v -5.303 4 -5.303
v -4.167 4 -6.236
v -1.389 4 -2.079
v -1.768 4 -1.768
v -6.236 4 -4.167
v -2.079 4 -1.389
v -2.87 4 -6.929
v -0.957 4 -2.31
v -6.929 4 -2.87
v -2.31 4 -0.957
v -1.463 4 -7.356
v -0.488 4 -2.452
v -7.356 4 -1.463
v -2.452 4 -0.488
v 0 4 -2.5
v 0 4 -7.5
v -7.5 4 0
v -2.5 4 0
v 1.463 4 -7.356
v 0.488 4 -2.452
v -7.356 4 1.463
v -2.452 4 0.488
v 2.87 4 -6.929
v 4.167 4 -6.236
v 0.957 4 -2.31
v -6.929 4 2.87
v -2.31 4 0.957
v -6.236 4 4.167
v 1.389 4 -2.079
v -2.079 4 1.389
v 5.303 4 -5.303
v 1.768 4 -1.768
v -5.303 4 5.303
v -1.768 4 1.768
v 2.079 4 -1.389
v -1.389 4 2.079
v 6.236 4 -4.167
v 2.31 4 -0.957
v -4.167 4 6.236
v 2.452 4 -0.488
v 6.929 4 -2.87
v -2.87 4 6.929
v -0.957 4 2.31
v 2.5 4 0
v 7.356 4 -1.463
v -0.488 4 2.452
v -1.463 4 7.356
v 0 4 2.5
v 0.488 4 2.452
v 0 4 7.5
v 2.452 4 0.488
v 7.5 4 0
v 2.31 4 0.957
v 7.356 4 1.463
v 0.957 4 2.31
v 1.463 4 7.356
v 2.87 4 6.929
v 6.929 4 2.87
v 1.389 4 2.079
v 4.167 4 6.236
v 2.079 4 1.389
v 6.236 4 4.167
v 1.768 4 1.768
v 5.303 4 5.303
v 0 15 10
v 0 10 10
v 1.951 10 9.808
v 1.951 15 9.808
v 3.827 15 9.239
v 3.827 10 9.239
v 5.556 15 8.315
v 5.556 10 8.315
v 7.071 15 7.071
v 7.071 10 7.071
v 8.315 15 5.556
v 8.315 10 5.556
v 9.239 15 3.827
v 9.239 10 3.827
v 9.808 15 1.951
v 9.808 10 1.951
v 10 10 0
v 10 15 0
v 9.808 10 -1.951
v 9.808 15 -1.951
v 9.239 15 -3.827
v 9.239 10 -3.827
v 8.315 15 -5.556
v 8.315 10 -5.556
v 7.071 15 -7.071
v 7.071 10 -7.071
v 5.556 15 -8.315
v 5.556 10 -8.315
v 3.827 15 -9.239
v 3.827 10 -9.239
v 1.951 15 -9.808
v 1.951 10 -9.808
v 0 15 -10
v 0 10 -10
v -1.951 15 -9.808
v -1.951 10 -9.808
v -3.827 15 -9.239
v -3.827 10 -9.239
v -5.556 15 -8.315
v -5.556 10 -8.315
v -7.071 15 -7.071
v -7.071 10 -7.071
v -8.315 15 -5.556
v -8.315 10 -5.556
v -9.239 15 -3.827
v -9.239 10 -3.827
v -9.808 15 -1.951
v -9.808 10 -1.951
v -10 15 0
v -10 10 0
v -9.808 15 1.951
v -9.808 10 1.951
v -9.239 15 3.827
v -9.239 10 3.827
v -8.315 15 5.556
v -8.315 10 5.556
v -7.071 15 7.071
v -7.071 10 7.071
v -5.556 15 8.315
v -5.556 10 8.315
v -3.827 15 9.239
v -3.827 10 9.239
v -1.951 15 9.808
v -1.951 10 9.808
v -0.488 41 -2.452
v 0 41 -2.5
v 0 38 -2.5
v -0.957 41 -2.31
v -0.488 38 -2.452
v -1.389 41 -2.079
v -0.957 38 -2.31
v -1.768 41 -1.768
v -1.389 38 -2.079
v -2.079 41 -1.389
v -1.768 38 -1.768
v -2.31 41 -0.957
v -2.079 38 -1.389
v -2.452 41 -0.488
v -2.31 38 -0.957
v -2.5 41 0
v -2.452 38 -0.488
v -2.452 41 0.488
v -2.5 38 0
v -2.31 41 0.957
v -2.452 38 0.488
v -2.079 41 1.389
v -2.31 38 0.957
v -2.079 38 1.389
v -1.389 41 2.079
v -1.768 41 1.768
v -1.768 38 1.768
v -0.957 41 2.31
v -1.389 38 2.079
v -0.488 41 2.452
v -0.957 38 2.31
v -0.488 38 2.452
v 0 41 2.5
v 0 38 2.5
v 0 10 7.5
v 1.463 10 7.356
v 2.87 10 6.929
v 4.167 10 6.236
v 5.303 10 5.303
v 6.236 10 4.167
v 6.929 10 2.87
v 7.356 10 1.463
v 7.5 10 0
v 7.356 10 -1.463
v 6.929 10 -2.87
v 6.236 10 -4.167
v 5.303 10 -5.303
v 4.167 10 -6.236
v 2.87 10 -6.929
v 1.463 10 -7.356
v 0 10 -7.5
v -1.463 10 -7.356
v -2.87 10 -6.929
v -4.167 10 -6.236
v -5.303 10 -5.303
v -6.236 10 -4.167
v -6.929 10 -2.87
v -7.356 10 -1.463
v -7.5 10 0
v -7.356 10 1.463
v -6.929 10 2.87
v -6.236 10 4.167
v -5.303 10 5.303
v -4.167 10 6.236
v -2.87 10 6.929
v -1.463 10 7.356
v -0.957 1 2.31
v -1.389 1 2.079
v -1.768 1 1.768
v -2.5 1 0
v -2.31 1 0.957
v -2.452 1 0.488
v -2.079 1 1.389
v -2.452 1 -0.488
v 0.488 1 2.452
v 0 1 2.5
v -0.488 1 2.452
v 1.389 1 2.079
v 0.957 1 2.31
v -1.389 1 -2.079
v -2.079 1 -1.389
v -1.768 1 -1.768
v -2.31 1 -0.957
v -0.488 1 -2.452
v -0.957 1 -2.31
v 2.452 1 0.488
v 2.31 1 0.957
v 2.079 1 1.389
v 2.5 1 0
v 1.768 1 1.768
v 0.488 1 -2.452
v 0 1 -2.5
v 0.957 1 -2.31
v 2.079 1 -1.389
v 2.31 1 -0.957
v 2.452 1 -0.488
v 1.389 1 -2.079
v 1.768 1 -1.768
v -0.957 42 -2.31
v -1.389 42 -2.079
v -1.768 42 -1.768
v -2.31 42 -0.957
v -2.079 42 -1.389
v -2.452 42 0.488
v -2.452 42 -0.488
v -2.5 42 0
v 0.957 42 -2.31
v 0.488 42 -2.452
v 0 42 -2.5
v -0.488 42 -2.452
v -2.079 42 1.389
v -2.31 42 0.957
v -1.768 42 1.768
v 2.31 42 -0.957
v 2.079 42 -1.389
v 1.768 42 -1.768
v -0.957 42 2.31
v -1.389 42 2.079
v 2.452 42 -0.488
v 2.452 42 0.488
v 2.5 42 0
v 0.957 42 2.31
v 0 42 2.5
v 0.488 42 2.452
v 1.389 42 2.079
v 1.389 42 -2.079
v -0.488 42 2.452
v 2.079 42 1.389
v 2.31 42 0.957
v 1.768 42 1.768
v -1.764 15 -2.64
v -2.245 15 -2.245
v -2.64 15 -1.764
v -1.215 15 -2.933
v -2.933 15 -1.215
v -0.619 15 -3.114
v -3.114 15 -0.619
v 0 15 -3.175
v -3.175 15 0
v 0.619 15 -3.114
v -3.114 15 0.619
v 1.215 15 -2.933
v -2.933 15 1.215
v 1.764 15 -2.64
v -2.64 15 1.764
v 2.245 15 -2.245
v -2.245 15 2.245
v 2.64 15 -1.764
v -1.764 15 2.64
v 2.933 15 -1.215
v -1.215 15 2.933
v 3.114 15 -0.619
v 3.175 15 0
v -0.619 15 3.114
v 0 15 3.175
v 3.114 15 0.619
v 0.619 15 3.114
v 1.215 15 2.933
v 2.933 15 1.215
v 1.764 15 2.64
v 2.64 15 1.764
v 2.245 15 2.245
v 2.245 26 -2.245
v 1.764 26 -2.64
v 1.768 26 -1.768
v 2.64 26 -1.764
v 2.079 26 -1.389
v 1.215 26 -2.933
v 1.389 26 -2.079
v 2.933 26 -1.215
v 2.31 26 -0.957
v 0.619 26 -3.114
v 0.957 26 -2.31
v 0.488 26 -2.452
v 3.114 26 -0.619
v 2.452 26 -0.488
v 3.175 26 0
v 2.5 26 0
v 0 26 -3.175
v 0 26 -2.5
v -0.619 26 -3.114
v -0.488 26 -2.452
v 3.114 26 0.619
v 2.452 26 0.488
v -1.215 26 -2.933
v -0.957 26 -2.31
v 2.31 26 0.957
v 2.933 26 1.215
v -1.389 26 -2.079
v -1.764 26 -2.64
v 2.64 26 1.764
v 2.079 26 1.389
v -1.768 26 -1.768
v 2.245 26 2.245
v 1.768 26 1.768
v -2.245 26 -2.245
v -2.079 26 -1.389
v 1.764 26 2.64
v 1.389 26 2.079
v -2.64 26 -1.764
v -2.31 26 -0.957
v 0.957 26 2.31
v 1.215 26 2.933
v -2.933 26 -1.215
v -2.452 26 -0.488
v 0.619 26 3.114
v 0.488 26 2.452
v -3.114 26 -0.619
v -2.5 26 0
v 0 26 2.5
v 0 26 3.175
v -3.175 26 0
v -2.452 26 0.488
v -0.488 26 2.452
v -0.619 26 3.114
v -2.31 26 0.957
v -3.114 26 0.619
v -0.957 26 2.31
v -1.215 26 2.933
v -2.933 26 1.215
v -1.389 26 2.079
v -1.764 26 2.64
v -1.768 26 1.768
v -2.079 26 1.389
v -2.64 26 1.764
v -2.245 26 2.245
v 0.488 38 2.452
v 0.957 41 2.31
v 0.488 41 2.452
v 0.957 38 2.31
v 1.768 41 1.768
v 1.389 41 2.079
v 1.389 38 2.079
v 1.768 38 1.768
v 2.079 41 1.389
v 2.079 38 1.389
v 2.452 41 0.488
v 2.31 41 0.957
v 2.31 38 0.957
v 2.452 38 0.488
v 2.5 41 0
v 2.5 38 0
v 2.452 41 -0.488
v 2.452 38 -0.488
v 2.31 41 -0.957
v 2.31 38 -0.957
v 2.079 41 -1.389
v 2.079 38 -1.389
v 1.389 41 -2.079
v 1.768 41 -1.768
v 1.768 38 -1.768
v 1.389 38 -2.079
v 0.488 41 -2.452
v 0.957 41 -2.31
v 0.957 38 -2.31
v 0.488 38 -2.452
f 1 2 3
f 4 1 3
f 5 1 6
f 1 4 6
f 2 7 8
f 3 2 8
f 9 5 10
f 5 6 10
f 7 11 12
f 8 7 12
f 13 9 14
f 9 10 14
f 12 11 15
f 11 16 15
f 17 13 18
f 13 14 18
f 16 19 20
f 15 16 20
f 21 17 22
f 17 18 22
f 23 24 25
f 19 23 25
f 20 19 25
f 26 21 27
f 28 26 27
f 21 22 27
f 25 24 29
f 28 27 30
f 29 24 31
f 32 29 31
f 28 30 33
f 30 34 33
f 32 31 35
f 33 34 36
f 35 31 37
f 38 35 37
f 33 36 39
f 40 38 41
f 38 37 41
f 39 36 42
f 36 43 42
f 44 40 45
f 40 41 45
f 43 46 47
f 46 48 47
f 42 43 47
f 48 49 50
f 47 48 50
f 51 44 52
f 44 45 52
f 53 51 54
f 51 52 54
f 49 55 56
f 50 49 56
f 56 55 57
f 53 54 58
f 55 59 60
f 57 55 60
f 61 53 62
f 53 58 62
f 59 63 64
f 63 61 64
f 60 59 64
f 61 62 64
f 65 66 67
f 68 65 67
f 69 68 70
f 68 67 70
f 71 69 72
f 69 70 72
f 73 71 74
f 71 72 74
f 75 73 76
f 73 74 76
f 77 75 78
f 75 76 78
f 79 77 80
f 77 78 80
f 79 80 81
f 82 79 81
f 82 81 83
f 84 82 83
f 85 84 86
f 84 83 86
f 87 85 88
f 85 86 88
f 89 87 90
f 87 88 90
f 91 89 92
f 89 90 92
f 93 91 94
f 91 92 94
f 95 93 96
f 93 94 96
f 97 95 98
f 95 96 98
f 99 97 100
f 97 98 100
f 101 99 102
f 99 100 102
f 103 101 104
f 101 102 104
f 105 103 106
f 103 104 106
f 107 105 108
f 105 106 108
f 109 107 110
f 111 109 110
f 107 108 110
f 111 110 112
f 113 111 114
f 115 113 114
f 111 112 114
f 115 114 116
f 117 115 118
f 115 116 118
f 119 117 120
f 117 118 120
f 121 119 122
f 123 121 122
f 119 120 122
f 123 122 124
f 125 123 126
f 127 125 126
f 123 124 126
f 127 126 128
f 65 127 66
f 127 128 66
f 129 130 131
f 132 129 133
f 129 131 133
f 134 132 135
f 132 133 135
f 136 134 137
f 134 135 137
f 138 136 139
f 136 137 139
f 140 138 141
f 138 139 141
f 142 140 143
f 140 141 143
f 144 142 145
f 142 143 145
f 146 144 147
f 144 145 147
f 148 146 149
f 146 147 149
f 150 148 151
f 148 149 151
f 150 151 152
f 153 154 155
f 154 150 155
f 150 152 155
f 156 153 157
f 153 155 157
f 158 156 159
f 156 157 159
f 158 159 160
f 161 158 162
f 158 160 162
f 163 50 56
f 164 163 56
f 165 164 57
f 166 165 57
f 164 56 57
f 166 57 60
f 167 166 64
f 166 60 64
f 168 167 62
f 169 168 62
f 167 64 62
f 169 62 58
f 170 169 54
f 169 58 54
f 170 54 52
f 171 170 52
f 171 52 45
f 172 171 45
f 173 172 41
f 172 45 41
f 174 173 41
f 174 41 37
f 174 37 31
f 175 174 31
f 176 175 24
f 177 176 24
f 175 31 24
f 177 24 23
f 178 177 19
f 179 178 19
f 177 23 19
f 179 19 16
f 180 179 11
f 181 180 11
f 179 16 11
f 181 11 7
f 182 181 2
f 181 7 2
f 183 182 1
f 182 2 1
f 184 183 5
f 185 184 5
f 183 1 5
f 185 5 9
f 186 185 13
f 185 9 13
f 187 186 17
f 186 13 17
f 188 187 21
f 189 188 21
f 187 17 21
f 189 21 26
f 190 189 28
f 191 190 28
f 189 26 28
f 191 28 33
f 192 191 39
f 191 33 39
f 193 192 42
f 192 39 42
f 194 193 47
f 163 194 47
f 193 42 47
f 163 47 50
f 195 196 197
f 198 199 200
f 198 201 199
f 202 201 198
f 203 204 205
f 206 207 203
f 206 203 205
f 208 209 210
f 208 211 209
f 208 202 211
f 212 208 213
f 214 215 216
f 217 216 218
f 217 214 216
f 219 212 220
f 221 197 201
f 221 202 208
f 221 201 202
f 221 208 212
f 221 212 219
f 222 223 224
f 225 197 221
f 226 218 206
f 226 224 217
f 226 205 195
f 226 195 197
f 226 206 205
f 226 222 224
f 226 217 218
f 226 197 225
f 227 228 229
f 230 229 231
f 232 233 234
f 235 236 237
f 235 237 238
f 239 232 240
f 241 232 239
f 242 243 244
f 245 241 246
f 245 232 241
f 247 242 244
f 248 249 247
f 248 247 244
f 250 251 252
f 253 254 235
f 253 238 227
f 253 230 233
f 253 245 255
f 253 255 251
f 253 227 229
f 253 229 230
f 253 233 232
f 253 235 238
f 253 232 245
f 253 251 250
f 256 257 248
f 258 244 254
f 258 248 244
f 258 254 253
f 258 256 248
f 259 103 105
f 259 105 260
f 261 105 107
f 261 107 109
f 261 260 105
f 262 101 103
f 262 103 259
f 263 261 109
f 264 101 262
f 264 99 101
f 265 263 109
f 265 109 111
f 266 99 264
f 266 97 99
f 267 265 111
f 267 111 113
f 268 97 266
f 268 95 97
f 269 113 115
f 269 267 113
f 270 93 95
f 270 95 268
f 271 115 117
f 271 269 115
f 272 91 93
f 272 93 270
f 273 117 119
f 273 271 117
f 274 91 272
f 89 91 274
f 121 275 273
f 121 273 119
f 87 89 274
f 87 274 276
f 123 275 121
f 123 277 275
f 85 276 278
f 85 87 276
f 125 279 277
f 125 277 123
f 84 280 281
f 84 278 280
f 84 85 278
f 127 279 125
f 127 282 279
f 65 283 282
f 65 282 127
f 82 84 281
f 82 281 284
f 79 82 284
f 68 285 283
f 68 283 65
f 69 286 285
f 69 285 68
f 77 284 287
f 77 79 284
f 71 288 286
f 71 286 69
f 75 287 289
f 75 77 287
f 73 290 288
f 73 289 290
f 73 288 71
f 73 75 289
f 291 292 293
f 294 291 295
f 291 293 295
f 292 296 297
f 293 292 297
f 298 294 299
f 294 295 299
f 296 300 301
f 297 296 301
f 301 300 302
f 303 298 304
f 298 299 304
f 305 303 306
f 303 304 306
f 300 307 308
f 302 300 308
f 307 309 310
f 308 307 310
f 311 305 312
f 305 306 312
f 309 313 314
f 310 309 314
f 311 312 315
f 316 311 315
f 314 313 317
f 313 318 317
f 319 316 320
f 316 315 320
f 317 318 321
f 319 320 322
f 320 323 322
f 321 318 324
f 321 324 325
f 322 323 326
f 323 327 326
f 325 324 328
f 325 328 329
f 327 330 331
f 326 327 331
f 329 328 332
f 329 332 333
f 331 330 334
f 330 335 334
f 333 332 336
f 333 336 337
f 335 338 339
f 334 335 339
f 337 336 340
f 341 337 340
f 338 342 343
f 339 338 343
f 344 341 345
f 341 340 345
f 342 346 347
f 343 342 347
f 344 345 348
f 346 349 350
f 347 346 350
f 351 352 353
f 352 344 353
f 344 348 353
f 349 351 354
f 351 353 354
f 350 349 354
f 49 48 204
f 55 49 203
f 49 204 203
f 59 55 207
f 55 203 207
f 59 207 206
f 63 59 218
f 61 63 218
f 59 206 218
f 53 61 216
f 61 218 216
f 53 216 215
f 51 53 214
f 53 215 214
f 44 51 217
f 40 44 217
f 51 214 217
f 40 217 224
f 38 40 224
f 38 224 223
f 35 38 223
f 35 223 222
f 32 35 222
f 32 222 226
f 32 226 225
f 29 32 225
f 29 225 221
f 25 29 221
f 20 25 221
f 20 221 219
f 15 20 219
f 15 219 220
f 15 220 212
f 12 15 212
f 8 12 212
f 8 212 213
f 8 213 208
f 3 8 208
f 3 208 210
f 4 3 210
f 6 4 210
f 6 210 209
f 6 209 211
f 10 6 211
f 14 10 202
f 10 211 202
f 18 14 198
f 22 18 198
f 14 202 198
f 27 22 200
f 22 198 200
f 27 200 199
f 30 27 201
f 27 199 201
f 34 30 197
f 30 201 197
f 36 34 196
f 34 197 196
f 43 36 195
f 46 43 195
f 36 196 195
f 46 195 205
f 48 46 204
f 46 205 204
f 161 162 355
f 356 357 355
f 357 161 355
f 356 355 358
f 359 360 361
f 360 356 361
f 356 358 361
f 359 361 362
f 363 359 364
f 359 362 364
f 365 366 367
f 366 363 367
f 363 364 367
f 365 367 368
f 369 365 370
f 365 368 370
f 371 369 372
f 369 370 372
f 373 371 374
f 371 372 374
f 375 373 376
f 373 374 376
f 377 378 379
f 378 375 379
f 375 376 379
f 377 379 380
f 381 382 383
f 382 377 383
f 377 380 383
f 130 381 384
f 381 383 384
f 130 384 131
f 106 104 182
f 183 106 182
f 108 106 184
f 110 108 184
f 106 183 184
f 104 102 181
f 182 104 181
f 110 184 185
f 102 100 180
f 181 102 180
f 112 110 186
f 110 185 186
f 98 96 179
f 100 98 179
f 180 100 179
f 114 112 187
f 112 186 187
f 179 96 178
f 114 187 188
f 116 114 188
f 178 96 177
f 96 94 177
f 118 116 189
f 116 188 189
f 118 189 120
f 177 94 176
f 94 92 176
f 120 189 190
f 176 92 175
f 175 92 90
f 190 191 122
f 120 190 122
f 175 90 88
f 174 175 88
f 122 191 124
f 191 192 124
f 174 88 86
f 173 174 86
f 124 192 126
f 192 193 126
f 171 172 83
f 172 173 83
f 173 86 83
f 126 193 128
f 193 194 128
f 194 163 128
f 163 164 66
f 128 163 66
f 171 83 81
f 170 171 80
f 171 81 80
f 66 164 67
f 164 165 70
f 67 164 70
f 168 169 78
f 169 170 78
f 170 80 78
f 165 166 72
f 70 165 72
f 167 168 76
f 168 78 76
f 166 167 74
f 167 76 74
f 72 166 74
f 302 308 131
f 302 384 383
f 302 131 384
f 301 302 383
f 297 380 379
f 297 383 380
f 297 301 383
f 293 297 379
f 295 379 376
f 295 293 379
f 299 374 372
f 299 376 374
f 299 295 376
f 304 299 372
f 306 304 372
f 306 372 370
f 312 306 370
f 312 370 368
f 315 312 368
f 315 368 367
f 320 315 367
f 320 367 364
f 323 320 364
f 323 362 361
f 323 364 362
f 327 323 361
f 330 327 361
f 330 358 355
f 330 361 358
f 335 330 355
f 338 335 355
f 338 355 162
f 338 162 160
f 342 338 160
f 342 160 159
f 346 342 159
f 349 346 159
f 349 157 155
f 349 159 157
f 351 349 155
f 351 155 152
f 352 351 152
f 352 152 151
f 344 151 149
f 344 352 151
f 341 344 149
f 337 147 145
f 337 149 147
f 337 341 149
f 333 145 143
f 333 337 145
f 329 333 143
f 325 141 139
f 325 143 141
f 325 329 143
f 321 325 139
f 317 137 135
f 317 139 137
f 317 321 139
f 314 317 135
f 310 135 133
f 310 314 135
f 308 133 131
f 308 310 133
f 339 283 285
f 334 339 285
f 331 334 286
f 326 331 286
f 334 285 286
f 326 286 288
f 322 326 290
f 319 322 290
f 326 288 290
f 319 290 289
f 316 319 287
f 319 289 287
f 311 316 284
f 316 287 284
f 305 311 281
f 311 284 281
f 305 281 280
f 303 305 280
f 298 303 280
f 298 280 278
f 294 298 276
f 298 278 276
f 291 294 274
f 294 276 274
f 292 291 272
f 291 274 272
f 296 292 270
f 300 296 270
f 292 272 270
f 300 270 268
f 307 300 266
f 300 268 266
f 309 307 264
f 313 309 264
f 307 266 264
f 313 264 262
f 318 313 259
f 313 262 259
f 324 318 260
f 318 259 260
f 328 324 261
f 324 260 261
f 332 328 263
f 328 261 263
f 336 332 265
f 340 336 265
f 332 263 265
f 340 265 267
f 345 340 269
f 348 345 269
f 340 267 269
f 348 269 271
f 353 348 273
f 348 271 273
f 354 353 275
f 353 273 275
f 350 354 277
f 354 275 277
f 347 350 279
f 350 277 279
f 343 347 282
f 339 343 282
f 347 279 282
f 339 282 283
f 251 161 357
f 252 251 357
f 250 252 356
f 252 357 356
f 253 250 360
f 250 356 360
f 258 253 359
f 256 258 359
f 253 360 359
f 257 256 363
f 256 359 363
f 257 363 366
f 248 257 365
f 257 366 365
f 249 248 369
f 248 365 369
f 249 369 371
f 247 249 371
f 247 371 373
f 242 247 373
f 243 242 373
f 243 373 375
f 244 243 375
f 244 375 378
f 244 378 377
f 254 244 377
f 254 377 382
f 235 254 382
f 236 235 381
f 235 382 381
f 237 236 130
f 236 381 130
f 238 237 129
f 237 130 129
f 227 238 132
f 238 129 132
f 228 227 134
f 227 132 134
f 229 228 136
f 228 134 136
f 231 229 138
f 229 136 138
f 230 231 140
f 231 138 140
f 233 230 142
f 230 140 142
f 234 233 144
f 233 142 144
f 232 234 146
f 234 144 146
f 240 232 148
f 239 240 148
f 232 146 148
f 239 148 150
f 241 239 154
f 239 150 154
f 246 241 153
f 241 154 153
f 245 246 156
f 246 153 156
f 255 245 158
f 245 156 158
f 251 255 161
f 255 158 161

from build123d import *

# Parameters (mm, degrees)
SKETCH_1_R               = 2.5
EXTRUDE_1_DEPTH          = 4
SKETCH_3_R               = 7.5
EXTRUDE_3_DEPTH          = 6
SKETCH_4_R               = 10
EXTRUDE_4_DEPTH          = 5
SKETCH_5_R               = 3.175
EXTRUDE_5_DEPTH          = 11
SKETCH_6_R               = 10
EXTRUDE_6_DEPTH          = 5
SKETCH_7_R               = 7.5
EXTRUDE_7_DEPTH          = 7
SKETCH_8_R               = 2.5
EXTRUDE_8_DEPTH          = 4
CUT_EXTRUDE_1_DEPTH      = 45.317039612
CUT_EXTRUDE_1_DEPTH_BACK = 1
SKETCH_10_R              = 2.5
SKETCH_13_R              = 10
SKETCH_13_R_2            = 2.5
CUT_EXTRUDE_3_DEPTH      = 15


with BuildPart() as part:
    # 草图1 → 凸台-拉伸1 (new body)
    with BuildSketch(Plane(origin=(0, 0, 0), x_dir=(1, 0, 0), z_dir=(0, 1, 0))):
        with Locations(Location((0, 0, 0), (0, 0, 270))):
            Circle(SKETCH_1_R)
    extrude(amount=EXTRUDE_1_DEPTH)

    # 草图3 → 凸台-拉伸3 (add)
    with BuildSketch(Plane(origin=(0, 4, 0), x_dir=(1, 0, 0), z_dir=(0, 1, 0))):
        with Locations(Location((0, 0, 0), (0, 0, 270))):
            Circle(SKETCH_3_R)
    extrude(amount=EXTRUDE_3_DEPTH)

    # 草图4 → 凸台-拉伸4 (add)
    with BuildSketch(Plane(origin=(0, 10, 0), x_dir=(1, 0, 0), z_dir=(0, 1, 0))):
        with Locations(Location((0, 0, 0), (0, 0, 270))):
            Circle(SKETCH_4_R)
    extrude(amount=EXTRUDE_4_DEPTH)

    # 草图5 → 凸台-拉伸5 (add)
    with BuildSketch(Plane(origin=(0, 15, 0), x_dir=(1, 0, 0), z_dir=(0, 1, 0))):
        with Locations(Location((0, 0, 0), (0, 0, 270))):
            Circle(SKETCH_5_R)
    extrude(amount=EXTRUDE_5_DEPTH)

    # 草图6 → 凸台-拉伸6 (add)
    with BuildSketch(Plane(origin=(0, 26, 0), x_dir=(1, 0, 0), z_dir=(0, 1, 0))):
        with Locations(Location((0, 0, 0), (0, 0, 270))):
            Circle(SKETCH_6_R)
    extrude(amount=EXTRUDE_6_DEPTH)

    # 草图7 → 凸台-拉伸7 (add)
    with BuildSketch(Plane(origin=(0, 31, 0), x_dir=(1, 0, 0), z_dir=(0, 1, 0))):
        with Locations(Location((0, 0, 0), (0, 0, 270))):
            Circle(SKETCH_7_R)
    extrude(amount=EXTRUDE_7_DEPTH)

    # 草图8 → 凸台-拉伸8 (add)
    with BuildSketch(Plane(origin=(0, 38, 0), x_dir=(1, 0, 0), z_dir=(0, 1, 0))):
        with Locations(Location((0, 0, 0), (0, 0, 270))):
            Circle(SKETCH_8_R)
    extrude(amount=EXTRUDE_8_DEPTH)

    # 草图10 → 切除-拉伸1 (cut, two sides: drawn at the far end of the back side and taken through both)
    with BuildSketch(Plane(origin=(0, 0, 0), x_dir=(-1, 0, 0), z_dir=(0, -1, 0)).offset(-CUT_EXTRUDE_1_DEPTH_BACK)):
        with Locations(Location((0, 0, 0), (0, 0, 90))):
            Circle(SKETCH_10_R)
    extrude(amount=CUT_EXTRUDE_1_DEPTH + CUT_EXTRUDE_1_DEPTH_BACK, mode=Mode.SUBTRACT)

    # 草图13 → 切除-拉伸3 (cut)
    with BuildSketch(Plane.XZ.offset(-26)):
        with Locations(Location((0, 0, 0), (0, 0, 90))):
            Circle(SKETCH_13_R)
        with Locations(Location((0, 0, 0), (0, 0, 270))):
            Circle(SKETCH_13_R_2, mode=Mode.SUBTRACT)
    extrude(amount=-CUT_EXTRUDE_3_DEPTH, mode=Mode.SUBTRACT)


solid = part.part
